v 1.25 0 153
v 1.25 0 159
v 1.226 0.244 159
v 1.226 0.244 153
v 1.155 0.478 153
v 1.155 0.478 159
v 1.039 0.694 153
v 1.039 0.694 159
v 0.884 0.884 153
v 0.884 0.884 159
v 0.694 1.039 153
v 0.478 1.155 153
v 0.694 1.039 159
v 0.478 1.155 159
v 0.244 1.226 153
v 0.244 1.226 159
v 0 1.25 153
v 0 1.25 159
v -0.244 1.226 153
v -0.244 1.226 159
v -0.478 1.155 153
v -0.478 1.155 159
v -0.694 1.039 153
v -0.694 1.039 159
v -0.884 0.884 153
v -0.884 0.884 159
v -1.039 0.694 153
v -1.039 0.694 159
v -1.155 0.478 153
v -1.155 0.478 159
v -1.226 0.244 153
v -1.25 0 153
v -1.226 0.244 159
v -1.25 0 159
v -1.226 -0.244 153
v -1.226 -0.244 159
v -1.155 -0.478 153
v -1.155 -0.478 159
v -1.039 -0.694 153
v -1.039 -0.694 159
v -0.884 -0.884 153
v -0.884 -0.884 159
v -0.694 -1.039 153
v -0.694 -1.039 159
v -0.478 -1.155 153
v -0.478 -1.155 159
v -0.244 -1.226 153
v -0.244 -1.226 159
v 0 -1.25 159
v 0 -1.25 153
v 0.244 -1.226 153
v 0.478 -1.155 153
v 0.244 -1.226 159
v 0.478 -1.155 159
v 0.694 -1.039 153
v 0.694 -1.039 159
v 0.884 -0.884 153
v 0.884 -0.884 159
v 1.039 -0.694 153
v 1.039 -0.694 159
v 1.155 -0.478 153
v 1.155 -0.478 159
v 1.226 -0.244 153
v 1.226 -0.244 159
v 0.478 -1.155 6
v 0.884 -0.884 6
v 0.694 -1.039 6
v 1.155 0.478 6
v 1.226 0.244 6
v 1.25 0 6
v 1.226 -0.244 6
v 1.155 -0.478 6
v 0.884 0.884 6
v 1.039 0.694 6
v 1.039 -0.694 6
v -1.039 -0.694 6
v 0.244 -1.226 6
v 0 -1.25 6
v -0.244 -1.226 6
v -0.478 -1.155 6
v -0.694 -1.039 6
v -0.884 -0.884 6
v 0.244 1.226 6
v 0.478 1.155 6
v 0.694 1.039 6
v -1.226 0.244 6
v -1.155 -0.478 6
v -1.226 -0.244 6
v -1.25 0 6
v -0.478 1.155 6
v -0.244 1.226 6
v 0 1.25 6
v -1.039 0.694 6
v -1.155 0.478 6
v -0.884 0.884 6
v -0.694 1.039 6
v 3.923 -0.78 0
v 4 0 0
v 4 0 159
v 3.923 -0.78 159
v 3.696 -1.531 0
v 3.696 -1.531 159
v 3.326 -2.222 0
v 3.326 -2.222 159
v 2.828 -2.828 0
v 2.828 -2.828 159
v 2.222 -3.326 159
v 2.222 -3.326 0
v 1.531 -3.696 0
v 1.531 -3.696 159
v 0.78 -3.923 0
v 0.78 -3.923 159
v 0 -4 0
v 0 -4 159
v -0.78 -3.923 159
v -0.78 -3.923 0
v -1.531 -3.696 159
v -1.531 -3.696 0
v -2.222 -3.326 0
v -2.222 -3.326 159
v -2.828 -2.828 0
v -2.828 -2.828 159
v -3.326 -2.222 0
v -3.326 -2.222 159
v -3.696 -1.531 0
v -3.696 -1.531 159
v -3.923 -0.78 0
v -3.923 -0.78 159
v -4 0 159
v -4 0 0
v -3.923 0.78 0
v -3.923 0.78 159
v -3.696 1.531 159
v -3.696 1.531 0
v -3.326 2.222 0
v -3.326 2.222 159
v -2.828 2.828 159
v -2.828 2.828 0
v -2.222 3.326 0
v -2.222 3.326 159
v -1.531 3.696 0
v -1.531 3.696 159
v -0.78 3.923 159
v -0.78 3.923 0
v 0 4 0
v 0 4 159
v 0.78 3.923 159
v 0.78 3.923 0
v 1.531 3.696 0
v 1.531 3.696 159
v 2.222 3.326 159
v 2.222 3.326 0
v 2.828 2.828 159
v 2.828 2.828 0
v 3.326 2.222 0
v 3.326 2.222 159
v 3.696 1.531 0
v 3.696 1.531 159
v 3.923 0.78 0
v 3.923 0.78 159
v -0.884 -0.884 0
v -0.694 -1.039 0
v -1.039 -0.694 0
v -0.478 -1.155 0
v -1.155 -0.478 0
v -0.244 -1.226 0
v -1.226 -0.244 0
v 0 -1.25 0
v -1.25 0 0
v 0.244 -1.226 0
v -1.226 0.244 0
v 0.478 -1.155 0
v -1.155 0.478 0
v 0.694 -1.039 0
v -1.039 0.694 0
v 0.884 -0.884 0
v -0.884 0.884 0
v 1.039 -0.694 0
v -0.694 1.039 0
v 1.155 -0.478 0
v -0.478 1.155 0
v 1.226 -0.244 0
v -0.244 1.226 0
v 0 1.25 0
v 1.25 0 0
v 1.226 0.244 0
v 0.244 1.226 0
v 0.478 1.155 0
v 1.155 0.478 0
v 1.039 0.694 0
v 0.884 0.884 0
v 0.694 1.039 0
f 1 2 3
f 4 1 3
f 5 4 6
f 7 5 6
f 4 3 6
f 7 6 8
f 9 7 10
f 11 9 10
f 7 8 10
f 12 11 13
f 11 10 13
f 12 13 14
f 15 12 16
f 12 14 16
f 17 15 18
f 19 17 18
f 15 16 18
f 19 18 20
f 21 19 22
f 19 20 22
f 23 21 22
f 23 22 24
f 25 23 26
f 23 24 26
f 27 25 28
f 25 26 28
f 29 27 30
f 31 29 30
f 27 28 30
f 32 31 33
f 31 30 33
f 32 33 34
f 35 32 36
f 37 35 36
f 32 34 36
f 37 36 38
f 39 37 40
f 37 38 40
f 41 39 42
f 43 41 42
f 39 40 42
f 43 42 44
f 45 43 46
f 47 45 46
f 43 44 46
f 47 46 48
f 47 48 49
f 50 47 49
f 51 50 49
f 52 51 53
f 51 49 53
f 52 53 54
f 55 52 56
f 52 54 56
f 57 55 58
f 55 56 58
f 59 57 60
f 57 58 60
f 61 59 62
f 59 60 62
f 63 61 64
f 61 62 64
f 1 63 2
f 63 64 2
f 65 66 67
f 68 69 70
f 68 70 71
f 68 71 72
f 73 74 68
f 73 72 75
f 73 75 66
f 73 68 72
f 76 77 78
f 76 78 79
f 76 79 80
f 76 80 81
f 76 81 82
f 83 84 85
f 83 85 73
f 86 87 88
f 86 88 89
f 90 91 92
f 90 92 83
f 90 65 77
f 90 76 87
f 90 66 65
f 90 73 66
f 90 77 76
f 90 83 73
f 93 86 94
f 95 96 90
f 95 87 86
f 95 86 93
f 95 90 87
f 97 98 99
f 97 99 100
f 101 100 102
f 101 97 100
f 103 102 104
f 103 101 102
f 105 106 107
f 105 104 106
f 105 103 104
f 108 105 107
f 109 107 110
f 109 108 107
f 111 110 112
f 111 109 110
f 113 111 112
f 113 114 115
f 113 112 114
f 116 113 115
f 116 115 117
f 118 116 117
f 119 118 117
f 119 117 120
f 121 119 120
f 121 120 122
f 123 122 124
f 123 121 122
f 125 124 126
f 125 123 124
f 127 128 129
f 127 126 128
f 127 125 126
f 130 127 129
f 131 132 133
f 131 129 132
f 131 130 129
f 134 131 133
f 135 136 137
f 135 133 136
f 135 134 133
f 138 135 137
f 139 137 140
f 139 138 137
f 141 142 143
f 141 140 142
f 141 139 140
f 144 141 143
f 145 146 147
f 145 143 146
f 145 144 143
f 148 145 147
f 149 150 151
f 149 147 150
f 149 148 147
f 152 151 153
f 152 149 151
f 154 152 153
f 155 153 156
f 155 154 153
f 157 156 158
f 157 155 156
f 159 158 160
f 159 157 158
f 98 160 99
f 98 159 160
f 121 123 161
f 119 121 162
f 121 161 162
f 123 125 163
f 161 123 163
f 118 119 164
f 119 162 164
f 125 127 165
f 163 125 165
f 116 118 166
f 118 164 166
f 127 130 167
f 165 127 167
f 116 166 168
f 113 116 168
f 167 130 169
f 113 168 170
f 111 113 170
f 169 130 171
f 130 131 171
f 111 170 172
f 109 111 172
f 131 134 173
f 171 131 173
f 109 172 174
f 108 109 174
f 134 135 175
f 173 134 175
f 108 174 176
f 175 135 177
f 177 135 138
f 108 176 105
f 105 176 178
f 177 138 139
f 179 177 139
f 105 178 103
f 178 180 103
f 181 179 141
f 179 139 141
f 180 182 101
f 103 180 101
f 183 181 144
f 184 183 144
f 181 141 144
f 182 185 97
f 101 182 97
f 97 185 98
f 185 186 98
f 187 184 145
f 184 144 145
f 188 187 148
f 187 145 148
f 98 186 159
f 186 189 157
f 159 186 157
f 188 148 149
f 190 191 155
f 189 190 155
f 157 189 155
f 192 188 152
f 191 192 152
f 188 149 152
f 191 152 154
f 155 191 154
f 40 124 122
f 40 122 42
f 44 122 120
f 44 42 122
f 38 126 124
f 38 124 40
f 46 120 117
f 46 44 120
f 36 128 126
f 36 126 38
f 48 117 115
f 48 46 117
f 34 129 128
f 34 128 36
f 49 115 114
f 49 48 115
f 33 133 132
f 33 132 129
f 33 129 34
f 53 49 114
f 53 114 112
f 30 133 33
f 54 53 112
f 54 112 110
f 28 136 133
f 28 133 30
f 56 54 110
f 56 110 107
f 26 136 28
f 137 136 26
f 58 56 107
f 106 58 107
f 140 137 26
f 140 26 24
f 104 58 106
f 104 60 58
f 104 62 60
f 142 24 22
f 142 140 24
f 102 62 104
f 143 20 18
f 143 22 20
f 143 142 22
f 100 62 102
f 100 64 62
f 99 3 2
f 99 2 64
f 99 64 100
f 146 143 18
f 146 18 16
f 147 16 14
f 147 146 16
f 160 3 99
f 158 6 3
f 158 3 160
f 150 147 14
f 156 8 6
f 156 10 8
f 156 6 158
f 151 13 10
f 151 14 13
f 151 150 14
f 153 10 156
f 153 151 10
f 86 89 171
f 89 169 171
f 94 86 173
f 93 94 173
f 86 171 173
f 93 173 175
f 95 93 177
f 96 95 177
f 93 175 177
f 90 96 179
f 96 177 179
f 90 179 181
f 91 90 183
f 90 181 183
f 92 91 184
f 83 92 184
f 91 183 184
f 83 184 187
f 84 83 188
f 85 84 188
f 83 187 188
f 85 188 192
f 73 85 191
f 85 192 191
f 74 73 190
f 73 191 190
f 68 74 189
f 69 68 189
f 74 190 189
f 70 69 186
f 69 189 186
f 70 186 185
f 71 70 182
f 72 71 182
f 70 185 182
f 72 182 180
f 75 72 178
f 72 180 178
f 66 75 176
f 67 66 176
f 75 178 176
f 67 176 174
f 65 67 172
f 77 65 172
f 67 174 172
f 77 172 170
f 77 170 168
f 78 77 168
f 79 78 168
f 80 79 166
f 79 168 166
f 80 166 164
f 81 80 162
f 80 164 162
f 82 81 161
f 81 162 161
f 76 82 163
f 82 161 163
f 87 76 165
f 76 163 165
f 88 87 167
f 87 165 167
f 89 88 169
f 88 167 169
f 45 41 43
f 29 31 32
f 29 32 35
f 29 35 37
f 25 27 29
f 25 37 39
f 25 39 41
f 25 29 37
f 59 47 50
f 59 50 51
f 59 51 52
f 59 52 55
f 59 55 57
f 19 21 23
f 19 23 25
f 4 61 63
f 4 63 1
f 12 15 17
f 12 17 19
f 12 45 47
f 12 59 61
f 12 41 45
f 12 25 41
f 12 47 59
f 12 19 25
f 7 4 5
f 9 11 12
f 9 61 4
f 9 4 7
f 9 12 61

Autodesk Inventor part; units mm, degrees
ref_plane "YZ Plane" through (0, 0, 0) normal (1, 0, 0) x (0, 1, 0)
ref_plane "XZ Plane" through (0, 0, 0) normal (0, 1, 0) x (-1, 0, 0)
ref_plane "XY Plane" through (0, 0, 0) normal (0, 0, 1) x (1, 0, 0)
sketch "スケッチ1" plane through (0, 0, 0) normal (0, 0, 1) x (1, 0, 0)
  circle A0 centre (0, 0) radius 4
  dimension "d0" = 8
extrude "押し出し1" add sketch "スケッチ1" along normal blind 159
sketch "スケッチ2" plane through (0, 0, 0) normal (0, 0, -1) x (-1, 0, 0)
  circle A0 centre (0, 0) radius 4 projected
  circle A1 centre (0, 0) radius 1.25
  dimension "d3" = 2.5
extrude "押し出し2" cut sketch "スケッチ2" against normal blind 6 contours A1
sketch "スケッチ3" plane through (0, 0, 159) normal (0, 0, 1) x (1, 0, 0)
  circle A0 centre (0, 0) radius 4 projected
  circle A1 centre (0, 0) radius 1.25 projected
  circle A2 centre (0, 0) radius 1.25
  dimension "d6" = 2.5
extrude "押し出し3" cut sketch "スケッチ3" against normal blind 6 contours A1
properties part number "シャフト　ポリカ" material "ポリカーボネート、クリア"
